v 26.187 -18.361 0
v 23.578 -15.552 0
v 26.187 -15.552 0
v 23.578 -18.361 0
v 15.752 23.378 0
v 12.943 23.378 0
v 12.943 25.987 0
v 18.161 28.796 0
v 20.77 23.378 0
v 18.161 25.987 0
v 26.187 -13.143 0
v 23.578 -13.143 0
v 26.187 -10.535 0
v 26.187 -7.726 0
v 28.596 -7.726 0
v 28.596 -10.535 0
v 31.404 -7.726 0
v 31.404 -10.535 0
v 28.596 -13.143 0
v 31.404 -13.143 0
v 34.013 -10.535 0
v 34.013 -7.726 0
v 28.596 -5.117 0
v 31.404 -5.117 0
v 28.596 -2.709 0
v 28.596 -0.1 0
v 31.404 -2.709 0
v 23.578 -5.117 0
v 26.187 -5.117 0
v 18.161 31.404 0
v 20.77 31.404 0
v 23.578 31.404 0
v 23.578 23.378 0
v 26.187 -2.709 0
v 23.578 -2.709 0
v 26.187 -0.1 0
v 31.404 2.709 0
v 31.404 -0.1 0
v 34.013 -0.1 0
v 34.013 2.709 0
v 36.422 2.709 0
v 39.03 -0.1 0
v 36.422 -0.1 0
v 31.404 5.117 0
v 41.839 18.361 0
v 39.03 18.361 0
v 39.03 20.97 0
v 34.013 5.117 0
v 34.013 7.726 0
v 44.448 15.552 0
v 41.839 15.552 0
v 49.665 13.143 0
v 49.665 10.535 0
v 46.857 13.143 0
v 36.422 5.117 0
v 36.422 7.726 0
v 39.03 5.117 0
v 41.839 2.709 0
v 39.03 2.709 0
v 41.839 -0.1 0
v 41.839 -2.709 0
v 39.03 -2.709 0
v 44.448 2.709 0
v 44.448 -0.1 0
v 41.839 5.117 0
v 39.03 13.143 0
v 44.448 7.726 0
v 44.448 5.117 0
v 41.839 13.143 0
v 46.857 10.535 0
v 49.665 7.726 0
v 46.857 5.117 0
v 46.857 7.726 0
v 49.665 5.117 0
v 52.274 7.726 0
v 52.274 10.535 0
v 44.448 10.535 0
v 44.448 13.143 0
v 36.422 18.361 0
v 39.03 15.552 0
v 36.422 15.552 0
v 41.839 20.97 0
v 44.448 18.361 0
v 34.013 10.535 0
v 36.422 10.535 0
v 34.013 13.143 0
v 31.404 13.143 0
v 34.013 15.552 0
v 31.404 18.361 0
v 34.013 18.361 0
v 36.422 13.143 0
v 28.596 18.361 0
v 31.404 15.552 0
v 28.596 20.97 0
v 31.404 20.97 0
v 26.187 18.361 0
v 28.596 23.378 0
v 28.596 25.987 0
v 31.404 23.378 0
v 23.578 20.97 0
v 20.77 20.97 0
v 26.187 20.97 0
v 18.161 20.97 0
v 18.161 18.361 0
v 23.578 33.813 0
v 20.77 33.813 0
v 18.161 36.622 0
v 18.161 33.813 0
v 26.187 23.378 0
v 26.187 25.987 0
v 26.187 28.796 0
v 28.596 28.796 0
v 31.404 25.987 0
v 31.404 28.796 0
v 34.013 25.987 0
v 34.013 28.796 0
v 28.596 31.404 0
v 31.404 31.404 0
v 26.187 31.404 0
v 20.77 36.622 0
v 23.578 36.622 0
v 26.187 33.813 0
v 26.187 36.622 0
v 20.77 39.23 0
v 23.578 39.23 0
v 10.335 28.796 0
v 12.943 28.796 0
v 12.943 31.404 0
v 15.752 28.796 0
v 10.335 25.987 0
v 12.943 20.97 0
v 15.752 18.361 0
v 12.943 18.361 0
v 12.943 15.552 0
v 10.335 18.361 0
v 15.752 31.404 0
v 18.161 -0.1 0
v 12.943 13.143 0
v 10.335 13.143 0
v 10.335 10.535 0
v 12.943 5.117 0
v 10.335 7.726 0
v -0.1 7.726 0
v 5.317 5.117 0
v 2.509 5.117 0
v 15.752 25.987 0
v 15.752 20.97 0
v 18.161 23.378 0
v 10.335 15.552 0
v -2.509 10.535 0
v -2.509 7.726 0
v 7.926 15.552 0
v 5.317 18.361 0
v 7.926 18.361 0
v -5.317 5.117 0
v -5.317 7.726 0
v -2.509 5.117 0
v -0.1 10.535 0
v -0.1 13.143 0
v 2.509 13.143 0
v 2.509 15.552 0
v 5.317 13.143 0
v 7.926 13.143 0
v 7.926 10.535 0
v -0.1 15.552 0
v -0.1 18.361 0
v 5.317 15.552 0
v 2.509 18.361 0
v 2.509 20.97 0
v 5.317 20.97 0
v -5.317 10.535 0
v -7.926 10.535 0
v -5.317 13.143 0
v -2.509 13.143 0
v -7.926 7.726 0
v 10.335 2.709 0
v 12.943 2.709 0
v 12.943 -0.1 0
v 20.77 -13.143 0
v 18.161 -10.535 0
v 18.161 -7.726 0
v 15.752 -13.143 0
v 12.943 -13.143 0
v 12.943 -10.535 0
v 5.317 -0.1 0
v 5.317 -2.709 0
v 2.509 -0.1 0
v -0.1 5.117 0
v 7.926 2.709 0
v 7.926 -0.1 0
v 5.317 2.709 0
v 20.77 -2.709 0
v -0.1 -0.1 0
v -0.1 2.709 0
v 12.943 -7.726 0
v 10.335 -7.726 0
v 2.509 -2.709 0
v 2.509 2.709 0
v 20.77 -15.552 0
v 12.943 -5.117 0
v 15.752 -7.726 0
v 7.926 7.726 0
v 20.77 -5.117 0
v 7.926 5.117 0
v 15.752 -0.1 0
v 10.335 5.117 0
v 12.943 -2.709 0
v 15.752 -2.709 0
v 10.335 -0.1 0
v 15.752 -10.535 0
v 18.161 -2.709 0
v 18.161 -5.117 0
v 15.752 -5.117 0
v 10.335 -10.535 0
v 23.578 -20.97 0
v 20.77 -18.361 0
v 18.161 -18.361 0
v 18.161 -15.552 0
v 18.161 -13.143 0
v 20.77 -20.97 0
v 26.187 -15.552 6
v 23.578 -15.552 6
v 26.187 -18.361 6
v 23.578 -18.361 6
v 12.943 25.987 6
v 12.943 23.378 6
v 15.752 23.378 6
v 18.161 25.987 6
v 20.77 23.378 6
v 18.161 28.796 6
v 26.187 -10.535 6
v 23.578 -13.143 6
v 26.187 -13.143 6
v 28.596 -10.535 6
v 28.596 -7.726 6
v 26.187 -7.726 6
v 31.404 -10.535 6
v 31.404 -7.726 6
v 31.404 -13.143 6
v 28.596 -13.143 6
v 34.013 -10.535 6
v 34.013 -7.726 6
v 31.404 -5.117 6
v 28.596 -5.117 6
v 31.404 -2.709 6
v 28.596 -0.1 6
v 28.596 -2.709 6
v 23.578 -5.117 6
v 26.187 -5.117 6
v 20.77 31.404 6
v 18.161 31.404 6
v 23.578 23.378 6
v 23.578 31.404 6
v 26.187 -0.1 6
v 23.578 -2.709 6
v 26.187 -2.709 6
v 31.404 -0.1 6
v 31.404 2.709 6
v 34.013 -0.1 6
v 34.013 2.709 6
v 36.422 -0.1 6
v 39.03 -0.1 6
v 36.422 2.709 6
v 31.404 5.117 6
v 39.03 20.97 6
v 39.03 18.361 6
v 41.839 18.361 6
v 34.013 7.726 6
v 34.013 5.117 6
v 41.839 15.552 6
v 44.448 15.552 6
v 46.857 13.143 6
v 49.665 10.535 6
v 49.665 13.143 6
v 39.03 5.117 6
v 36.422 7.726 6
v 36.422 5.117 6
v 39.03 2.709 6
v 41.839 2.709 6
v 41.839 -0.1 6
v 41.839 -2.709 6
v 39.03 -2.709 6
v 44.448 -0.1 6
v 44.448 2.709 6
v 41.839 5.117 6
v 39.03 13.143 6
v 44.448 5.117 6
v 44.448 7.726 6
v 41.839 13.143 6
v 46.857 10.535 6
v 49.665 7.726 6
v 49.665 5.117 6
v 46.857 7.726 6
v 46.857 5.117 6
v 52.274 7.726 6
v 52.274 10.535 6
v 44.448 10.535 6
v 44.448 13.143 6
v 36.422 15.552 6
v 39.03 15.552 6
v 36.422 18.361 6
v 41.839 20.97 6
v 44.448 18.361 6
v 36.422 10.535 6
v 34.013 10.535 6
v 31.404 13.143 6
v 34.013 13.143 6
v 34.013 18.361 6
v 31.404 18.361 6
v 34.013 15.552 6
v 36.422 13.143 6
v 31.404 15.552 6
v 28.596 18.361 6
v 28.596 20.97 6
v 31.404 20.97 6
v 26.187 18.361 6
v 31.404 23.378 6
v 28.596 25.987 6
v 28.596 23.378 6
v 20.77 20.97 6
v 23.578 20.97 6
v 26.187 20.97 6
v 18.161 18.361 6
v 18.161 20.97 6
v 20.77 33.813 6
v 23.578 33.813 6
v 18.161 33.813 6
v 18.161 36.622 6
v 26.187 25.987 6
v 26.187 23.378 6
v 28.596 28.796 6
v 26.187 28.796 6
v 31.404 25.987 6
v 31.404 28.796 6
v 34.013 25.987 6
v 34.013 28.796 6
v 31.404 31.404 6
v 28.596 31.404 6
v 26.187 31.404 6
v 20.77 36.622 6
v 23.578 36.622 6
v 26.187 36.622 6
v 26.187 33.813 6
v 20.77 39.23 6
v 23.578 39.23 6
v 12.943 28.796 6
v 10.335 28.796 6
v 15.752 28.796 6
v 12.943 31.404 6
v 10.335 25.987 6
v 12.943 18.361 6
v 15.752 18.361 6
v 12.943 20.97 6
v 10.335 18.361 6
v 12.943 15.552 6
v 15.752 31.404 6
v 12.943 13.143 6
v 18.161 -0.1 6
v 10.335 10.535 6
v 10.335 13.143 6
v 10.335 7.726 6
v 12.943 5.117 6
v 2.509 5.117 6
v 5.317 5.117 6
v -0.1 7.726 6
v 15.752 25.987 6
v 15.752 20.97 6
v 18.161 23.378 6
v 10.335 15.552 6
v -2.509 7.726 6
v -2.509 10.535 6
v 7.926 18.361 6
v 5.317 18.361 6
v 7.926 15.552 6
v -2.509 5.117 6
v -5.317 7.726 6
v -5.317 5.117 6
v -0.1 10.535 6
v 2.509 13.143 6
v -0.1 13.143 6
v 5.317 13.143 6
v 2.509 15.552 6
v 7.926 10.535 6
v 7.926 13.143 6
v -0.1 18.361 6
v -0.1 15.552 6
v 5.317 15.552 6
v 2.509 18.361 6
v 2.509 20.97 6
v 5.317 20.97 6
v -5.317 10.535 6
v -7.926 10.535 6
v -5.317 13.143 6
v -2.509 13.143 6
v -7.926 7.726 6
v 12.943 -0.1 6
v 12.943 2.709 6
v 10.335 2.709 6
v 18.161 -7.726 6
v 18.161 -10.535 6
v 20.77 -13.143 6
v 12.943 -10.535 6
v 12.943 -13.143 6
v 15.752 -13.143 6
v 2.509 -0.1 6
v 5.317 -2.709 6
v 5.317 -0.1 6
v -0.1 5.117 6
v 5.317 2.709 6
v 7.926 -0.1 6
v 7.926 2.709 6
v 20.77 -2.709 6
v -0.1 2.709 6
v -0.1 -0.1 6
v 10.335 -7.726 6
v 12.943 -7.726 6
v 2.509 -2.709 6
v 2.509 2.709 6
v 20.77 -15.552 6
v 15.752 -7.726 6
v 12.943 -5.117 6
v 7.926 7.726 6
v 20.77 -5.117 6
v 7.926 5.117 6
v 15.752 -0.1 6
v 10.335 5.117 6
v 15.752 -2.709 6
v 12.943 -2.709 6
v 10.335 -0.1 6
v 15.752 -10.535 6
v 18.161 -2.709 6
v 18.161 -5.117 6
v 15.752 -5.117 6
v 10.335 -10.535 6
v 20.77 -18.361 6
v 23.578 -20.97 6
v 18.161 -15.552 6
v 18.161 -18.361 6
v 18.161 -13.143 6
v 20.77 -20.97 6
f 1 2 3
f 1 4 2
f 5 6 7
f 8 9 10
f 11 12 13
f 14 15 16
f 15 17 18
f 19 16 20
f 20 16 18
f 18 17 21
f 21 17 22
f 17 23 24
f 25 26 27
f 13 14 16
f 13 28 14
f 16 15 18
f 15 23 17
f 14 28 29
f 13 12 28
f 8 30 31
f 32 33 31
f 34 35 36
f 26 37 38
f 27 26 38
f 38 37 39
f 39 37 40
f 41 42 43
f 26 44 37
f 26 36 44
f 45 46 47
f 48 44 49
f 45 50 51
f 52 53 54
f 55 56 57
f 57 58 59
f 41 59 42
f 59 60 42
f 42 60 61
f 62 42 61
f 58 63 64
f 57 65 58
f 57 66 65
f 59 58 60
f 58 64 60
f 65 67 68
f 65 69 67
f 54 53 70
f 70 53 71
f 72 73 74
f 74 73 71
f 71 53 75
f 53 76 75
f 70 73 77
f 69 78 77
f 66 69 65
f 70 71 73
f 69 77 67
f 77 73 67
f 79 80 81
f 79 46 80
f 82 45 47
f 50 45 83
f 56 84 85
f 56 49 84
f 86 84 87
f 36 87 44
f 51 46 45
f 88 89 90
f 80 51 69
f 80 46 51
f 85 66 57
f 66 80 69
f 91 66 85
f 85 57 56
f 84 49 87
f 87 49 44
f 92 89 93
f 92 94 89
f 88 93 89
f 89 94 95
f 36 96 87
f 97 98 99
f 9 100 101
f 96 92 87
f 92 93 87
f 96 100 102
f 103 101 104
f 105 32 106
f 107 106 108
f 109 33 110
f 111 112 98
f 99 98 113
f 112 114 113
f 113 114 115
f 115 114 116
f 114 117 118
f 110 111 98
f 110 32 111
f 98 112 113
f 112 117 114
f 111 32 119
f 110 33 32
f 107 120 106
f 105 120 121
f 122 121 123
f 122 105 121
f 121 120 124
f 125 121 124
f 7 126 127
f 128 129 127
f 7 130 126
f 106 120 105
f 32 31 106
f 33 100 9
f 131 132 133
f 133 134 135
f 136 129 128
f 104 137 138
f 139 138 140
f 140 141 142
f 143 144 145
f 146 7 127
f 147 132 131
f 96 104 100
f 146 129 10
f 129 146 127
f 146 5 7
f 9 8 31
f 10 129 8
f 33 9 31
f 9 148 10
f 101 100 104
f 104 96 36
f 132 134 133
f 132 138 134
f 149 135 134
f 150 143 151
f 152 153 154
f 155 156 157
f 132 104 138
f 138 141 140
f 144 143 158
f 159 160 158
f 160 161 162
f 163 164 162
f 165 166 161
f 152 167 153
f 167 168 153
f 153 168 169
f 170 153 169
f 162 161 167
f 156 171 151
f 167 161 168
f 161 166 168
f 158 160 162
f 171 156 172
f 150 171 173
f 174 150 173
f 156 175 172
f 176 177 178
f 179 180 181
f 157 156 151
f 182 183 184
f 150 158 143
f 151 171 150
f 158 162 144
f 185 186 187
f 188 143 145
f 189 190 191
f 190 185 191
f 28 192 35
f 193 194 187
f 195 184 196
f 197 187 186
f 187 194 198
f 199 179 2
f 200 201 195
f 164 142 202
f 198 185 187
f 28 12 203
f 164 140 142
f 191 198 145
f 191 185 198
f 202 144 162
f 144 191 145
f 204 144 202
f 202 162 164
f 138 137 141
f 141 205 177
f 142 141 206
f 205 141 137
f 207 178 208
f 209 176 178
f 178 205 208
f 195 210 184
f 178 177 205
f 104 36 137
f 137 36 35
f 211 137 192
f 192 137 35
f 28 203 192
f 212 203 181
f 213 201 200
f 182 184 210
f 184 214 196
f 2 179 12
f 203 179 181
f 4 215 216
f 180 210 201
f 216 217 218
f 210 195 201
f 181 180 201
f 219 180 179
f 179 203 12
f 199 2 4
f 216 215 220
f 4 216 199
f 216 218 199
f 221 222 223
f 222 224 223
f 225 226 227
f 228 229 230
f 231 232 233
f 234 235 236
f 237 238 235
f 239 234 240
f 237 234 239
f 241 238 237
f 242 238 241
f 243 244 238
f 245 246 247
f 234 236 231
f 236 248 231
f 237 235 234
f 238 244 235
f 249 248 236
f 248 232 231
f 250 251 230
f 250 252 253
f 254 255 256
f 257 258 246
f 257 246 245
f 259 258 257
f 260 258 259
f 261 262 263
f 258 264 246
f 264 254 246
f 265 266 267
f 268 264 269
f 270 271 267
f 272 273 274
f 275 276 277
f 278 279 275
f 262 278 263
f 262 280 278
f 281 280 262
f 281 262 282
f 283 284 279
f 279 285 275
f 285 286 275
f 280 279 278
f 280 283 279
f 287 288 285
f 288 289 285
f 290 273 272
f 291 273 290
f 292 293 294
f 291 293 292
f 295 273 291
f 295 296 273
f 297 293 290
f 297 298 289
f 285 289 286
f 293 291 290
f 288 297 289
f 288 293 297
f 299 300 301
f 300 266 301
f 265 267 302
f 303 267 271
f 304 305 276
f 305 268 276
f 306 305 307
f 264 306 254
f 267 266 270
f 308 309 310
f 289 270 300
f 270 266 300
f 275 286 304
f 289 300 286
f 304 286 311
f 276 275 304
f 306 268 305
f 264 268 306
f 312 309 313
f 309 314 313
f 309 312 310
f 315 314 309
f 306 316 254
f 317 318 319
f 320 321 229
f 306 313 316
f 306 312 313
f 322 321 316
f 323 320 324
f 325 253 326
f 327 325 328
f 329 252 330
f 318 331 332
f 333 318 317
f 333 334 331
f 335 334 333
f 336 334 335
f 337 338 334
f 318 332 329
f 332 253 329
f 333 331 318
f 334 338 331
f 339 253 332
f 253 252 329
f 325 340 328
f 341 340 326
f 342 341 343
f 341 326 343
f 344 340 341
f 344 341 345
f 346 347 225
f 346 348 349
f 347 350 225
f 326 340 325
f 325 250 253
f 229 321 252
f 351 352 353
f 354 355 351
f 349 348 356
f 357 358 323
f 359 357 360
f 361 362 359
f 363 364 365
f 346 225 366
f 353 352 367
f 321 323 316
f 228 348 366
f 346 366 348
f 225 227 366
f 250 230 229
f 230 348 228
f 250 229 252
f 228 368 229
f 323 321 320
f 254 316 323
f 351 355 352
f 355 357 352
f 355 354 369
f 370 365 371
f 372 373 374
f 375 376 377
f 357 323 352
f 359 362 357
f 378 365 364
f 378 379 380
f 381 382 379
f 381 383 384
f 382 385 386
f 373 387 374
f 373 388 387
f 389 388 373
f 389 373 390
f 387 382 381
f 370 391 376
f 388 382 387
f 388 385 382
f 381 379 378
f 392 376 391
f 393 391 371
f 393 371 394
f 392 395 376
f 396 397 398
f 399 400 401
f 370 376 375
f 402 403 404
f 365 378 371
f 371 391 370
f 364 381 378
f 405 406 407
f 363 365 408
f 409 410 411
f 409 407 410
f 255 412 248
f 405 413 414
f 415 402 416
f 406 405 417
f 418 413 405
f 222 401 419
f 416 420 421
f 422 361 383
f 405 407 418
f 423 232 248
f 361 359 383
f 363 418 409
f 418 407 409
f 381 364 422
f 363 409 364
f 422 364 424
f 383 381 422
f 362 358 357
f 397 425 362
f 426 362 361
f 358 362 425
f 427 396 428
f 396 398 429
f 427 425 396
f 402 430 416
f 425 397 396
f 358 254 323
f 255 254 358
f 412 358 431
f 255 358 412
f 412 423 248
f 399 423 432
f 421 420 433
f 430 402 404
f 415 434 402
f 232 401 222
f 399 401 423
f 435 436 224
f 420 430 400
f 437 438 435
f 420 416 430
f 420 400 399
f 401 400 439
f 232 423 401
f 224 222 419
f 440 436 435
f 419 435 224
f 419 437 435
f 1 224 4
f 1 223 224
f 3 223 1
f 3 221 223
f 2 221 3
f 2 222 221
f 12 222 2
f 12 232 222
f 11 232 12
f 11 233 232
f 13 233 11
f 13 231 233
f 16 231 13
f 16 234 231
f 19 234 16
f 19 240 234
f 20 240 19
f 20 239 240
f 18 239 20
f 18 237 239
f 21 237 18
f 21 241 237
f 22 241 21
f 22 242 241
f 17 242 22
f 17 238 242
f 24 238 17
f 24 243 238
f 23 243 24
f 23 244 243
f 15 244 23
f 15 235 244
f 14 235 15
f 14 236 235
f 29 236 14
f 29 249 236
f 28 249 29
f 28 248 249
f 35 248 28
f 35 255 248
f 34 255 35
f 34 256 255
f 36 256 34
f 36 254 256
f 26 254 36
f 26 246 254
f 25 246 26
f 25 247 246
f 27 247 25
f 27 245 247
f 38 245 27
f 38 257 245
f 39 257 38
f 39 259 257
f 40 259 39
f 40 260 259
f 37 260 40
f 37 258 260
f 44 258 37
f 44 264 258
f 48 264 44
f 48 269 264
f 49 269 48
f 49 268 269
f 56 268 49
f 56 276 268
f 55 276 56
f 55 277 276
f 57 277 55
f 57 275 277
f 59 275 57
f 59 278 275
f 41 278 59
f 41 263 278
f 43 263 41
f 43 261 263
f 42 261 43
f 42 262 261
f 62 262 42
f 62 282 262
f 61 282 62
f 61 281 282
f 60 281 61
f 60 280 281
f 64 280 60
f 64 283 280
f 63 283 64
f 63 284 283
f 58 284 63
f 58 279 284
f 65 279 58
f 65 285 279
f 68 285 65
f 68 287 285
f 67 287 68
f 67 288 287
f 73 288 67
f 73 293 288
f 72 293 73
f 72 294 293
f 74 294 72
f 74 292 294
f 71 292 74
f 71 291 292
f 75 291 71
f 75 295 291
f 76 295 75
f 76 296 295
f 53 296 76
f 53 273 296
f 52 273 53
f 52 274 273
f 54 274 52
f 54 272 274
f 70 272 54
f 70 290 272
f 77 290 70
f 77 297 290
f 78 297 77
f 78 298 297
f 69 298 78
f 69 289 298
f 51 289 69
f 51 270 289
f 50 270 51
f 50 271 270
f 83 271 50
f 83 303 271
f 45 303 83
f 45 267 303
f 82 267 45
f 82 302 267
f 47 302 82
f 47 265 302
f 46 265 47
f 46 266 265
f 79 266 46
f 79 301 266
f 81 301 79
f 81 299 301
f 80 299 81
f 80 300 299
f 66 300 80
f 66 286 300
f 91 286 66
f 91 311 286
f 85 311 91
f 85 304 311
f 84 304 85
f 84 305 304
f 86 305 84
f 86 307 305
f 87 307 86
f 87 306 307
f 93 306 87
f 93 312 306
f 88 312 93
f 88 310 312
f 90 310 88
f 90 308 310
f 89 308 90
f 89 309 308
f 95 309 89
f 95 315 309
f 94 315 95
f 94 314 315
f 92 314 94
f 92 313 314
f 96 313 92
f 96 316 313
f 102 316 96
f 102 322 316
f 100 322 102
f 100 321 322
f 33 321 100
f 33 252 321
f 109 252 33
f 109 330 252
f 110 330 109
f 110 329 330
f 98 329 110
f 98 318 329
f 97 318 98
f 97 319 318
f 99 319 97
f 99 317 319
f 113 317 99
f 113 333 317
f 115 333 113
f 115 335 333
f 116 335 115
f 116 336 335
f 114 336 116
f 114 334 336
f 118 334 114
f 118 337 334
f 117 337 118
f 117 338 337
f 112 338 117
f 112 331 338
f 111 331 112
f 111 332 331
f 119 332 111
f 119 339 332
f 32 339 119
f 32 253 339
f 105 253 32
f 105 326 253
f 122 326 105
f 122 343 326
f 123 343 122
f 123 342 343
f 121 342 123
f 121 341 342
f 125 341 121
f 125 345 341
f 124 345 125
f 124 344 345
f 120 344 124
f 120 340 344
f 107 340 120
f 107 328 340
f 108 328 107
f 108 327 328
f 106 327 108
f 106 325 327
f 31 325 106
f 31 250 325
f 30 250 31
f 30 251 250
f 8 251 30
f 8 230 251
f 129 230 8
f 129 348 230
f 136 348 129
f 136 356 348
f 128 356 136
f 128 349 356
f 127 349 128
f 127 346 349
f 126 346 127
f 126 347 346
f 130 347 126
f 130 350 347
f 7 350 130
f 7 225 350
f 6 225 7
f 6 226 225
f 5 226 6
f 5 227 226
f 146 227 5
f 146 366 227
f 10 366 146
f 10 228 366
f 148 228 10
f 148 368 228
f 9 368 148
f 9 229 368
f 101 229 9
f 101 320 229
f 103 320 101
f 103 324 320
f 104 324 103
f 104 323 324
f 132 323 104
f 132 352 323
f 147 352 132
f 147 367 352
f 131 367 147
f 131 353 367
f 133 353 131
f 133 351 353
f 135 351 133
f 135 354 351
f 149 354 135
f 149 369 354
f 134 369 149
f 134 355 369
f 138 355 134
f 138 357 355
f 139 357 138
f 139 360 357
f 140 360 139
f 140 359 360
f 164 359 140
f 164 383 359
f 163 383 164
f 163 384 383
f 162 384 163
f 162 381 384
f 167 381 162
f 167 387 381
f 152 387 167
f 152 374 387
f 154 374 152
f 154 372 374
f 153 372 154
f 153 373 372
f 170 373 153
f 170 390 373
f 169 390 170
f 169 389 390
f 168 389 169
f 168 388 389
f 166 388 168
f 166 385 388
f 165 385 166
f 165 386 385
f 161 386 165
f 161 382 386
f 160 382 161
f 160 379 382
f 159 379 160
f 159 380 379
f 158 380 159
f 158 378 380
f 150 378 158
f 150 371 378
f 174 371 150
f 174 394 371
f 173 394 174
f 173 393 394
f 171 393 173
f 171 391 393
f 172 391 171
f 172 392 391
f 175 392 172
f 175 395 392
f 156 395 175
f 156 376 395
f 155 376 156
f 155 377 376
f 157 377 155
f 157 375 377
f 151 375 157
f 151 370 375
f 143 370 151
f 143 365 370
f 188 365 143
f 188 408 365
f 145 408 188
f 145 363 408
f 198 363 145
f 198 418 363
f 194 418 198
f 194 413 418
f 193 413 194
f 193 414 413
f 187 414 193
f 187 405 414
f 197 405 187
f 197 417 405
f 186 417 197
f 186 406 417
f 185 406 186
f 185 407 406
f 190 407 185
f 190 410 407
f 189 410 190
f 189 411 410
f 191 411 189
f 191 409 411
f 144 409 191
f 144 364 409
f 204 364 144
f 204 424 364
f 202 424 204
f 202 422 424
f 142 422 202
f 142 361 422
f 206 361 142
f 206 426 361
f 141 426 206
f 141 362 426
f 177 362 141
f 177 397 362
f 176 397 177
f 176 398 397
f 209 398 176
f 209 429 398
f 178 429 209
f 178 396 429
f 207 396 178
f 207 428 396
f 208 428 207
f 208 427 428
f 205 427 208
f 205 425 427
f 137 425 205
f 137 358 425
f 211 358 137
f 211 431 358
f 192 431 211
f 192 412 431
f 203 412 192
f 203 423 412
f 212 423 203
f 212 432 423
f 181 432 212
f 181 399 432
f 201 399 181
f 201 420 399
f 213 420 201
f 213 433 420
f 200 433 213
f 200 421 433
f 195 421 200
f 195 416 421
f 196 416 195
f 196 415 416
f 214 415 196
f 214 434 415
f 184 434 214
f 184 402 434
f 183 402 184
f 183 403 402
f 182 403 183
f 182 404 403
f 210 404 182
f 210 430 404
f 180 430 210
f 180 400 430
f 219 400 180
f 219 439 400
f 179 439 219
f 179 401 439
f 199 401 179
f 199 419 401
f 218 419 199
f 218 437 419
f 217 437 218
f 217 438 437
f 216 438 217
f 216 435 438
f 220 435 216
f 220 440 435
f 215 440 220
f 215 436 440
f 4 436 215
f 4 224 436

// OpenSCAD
/* see https://link.springer.com/content/pdf/10.1007%2F978-3-642-04397-0_7.pdf

missed configuration added
issues with offsetting fixed

Kit Wallace 2019-03-17
*/

//order of fibonacci curve 0 to 4 - higher causes recursion problems
k=3;
//width of pattern
width=60;
//inset amount for kerf/clearance -0.035 is typical for laser
inset=-0.1;
//height  0 is 2D for laser
height=6;

function fib(n) =
    n==0 ?0 :
    n==1 ?1 :
    fib(n-1)+fib(n-2);
    
function mirror(s,i=0) =  
   i <len(s)
     ? str(  s[i]=="R" ? "L" : "R",
             mirror(s,i+1))
     : "";

function fib_curve(n)=
    n==0 ? "" :
    n==1 ? "R" :
    n%3==2? str(fib_curve(n-1),fib_curve(n-2)) :
      str(fib_curve(n-1),mirror(fib_curve(n-2)));
  
     
function lr_to_peri(f) =
  [for (i=[0:len(f)-1])
      let(d=f[i])
      [1,d=="R"? 270: d=="L"? 90 : 0]
  ];

module fx(k,side=1,dir,inset=0) {
fib_curve=fib_curve(k);
fib_dir = k % 2 == 0 ?  fib_curve : mirror(fib_curve);   
peri=scale_peri(repeat_peri(lr_to_peri(fib_dir),4),side);
tile=inset_tile(peri_to_tile(peri),inset);
fill_tile(tile);
};

specs =  [[1,0,1],[4,0,3],[7,28,9],[10,12,23],[13,54,56]];

spec=specs[k];
n=spec[0];  // fibonacci order
t=spec[1];  // used for tessellation
dir= k % 2; // direction of path - 1 anticlockwise, -1 clockwise 
side = width / spec[2];
if (height > 0)
    linear_extrude(height=height)
      fx(n,t,side=side,dir=dir,inset=dir*inset); 
else 
      fx(n,t,side=side,dir=dir,inset=dir*inset); 

// extracts from tiling library

module fill_tile(tile,col="red") {
    color(col)
       polygon(3d_to_2d(tile)); 
};

 // functions
 
function replace_sides(peri,sides) =
 flatten( [for (i=[0:len(peri)-1])
      let (bside = peri[i])
      let (mside =  sides[i % len(sides)])
      let (mside_m = 
              len(mside) >1 
                 ? concat([for (i=[0:len(mside)-2]) mside[i]],[[mside[len(mside)-1][0],bside[1]]])
                 : [[mside[0][0],bside[1]]]
           )
      let (mside_length = peri_error(mside_m))
      let (mside_scaled = scale_peri(mside_m,bside[0]/mside_length))
      mside_scaled
  ]);

function peri_to_points(peri,pos=[0,0,0],dir=0,i=0) =
    i == len(peri)
      ? [pos]
      : let (side = peri[i])
        let (distance = side[0])
        let (newpos = pos + distance* [cos(dir), sin(dir),0])
        let (angle = side[1])
        let (newdir = dir + (180 - angle))
        concat([pos],peri_to_points(peri,newpos,newdir,i+1)) 
     ;                 

function peri_to_tile(peri,last=false) = 
    let (p = peri_to_points(norm_peri(peri)))  
    last 
       ? [for (i=[0:len(p)-1]) p[i]] 
       : [for (i=[0:len(p)-2]) p[i]]; 

function norm_peri(peri) =
     [for (p=peri)
        len(p)==undef
           ? [1,p]
           :[p.x,p.y] 
     ];
function repeat_peri(p,n) =
   norm_peri( flatten([for (i=[0:n-1]) p]));
    
function scale_peri(peri,scale) =
   [for (p=peri)
        len(p)==undef
           ? [scale,p]
           :[scale * p[0],p[1]] 
   ];
   
function peri_error(peri) = 
    norm(peri_end(peri));

function peri_end(peri) =
    let(t=peri_to_tile(peri,true))
    t[len(t)-1];    
  
function translate_tile(t,d) =
      [for (p=t) p+d]; 
        
function centre_tile(t) =
    let(c = v_avg(t))
    translate_tile(t,-c);

function inset_tile (tile, d=0.1) =
  [for (i=[0:len(tile)-1])
      let (v1 = unitv(tile[(i+len(tile) - 1 )% len(tile)] - tile[i]))
      let (v2 = unitv(tile[i] - tile[(i+1 )% len(tile)] ))
      let (vm = unitv((v1 - v2) /2))
      let (a = 180 - angle_between(v1,v2))
      let (offset = d / sin(a/2))
      tile[i]+offset * vm
  ];
  
 function angle_between(u, v) = 
     let (x= unitv(u) * unitv(v))
     let (y = x <= -1 ? -1 :x >= 1 ? 1 : x)
     let (a = acos(y))
     let (d = cross(u,v).z)
      d  > 0 ? a : 360- a;
  
function unitv(v)=  
   let (n = norm(v))
   n !=0 ? v/ norm(v) : v;
  
function 3d_to_2d(points)=
    [ for (p=points) [p.x,p.y]];
function v_avg(v) =v_sum(v) / len(v);
      
function zero(v) =
    len(v) == undef ? 0 : [for (i=[0:len(v)-1]) 0];
        
function v_sum_r(v,n,k) =
      k < n ?  v[k] + v_sum_r(v,n,k+1) : zero(v[0]) ;

function v_sum(v) = v_sum_r(v,len(v),0);
      
function flatten(l) = [ for (a = l) for (b = a) b ] ;
